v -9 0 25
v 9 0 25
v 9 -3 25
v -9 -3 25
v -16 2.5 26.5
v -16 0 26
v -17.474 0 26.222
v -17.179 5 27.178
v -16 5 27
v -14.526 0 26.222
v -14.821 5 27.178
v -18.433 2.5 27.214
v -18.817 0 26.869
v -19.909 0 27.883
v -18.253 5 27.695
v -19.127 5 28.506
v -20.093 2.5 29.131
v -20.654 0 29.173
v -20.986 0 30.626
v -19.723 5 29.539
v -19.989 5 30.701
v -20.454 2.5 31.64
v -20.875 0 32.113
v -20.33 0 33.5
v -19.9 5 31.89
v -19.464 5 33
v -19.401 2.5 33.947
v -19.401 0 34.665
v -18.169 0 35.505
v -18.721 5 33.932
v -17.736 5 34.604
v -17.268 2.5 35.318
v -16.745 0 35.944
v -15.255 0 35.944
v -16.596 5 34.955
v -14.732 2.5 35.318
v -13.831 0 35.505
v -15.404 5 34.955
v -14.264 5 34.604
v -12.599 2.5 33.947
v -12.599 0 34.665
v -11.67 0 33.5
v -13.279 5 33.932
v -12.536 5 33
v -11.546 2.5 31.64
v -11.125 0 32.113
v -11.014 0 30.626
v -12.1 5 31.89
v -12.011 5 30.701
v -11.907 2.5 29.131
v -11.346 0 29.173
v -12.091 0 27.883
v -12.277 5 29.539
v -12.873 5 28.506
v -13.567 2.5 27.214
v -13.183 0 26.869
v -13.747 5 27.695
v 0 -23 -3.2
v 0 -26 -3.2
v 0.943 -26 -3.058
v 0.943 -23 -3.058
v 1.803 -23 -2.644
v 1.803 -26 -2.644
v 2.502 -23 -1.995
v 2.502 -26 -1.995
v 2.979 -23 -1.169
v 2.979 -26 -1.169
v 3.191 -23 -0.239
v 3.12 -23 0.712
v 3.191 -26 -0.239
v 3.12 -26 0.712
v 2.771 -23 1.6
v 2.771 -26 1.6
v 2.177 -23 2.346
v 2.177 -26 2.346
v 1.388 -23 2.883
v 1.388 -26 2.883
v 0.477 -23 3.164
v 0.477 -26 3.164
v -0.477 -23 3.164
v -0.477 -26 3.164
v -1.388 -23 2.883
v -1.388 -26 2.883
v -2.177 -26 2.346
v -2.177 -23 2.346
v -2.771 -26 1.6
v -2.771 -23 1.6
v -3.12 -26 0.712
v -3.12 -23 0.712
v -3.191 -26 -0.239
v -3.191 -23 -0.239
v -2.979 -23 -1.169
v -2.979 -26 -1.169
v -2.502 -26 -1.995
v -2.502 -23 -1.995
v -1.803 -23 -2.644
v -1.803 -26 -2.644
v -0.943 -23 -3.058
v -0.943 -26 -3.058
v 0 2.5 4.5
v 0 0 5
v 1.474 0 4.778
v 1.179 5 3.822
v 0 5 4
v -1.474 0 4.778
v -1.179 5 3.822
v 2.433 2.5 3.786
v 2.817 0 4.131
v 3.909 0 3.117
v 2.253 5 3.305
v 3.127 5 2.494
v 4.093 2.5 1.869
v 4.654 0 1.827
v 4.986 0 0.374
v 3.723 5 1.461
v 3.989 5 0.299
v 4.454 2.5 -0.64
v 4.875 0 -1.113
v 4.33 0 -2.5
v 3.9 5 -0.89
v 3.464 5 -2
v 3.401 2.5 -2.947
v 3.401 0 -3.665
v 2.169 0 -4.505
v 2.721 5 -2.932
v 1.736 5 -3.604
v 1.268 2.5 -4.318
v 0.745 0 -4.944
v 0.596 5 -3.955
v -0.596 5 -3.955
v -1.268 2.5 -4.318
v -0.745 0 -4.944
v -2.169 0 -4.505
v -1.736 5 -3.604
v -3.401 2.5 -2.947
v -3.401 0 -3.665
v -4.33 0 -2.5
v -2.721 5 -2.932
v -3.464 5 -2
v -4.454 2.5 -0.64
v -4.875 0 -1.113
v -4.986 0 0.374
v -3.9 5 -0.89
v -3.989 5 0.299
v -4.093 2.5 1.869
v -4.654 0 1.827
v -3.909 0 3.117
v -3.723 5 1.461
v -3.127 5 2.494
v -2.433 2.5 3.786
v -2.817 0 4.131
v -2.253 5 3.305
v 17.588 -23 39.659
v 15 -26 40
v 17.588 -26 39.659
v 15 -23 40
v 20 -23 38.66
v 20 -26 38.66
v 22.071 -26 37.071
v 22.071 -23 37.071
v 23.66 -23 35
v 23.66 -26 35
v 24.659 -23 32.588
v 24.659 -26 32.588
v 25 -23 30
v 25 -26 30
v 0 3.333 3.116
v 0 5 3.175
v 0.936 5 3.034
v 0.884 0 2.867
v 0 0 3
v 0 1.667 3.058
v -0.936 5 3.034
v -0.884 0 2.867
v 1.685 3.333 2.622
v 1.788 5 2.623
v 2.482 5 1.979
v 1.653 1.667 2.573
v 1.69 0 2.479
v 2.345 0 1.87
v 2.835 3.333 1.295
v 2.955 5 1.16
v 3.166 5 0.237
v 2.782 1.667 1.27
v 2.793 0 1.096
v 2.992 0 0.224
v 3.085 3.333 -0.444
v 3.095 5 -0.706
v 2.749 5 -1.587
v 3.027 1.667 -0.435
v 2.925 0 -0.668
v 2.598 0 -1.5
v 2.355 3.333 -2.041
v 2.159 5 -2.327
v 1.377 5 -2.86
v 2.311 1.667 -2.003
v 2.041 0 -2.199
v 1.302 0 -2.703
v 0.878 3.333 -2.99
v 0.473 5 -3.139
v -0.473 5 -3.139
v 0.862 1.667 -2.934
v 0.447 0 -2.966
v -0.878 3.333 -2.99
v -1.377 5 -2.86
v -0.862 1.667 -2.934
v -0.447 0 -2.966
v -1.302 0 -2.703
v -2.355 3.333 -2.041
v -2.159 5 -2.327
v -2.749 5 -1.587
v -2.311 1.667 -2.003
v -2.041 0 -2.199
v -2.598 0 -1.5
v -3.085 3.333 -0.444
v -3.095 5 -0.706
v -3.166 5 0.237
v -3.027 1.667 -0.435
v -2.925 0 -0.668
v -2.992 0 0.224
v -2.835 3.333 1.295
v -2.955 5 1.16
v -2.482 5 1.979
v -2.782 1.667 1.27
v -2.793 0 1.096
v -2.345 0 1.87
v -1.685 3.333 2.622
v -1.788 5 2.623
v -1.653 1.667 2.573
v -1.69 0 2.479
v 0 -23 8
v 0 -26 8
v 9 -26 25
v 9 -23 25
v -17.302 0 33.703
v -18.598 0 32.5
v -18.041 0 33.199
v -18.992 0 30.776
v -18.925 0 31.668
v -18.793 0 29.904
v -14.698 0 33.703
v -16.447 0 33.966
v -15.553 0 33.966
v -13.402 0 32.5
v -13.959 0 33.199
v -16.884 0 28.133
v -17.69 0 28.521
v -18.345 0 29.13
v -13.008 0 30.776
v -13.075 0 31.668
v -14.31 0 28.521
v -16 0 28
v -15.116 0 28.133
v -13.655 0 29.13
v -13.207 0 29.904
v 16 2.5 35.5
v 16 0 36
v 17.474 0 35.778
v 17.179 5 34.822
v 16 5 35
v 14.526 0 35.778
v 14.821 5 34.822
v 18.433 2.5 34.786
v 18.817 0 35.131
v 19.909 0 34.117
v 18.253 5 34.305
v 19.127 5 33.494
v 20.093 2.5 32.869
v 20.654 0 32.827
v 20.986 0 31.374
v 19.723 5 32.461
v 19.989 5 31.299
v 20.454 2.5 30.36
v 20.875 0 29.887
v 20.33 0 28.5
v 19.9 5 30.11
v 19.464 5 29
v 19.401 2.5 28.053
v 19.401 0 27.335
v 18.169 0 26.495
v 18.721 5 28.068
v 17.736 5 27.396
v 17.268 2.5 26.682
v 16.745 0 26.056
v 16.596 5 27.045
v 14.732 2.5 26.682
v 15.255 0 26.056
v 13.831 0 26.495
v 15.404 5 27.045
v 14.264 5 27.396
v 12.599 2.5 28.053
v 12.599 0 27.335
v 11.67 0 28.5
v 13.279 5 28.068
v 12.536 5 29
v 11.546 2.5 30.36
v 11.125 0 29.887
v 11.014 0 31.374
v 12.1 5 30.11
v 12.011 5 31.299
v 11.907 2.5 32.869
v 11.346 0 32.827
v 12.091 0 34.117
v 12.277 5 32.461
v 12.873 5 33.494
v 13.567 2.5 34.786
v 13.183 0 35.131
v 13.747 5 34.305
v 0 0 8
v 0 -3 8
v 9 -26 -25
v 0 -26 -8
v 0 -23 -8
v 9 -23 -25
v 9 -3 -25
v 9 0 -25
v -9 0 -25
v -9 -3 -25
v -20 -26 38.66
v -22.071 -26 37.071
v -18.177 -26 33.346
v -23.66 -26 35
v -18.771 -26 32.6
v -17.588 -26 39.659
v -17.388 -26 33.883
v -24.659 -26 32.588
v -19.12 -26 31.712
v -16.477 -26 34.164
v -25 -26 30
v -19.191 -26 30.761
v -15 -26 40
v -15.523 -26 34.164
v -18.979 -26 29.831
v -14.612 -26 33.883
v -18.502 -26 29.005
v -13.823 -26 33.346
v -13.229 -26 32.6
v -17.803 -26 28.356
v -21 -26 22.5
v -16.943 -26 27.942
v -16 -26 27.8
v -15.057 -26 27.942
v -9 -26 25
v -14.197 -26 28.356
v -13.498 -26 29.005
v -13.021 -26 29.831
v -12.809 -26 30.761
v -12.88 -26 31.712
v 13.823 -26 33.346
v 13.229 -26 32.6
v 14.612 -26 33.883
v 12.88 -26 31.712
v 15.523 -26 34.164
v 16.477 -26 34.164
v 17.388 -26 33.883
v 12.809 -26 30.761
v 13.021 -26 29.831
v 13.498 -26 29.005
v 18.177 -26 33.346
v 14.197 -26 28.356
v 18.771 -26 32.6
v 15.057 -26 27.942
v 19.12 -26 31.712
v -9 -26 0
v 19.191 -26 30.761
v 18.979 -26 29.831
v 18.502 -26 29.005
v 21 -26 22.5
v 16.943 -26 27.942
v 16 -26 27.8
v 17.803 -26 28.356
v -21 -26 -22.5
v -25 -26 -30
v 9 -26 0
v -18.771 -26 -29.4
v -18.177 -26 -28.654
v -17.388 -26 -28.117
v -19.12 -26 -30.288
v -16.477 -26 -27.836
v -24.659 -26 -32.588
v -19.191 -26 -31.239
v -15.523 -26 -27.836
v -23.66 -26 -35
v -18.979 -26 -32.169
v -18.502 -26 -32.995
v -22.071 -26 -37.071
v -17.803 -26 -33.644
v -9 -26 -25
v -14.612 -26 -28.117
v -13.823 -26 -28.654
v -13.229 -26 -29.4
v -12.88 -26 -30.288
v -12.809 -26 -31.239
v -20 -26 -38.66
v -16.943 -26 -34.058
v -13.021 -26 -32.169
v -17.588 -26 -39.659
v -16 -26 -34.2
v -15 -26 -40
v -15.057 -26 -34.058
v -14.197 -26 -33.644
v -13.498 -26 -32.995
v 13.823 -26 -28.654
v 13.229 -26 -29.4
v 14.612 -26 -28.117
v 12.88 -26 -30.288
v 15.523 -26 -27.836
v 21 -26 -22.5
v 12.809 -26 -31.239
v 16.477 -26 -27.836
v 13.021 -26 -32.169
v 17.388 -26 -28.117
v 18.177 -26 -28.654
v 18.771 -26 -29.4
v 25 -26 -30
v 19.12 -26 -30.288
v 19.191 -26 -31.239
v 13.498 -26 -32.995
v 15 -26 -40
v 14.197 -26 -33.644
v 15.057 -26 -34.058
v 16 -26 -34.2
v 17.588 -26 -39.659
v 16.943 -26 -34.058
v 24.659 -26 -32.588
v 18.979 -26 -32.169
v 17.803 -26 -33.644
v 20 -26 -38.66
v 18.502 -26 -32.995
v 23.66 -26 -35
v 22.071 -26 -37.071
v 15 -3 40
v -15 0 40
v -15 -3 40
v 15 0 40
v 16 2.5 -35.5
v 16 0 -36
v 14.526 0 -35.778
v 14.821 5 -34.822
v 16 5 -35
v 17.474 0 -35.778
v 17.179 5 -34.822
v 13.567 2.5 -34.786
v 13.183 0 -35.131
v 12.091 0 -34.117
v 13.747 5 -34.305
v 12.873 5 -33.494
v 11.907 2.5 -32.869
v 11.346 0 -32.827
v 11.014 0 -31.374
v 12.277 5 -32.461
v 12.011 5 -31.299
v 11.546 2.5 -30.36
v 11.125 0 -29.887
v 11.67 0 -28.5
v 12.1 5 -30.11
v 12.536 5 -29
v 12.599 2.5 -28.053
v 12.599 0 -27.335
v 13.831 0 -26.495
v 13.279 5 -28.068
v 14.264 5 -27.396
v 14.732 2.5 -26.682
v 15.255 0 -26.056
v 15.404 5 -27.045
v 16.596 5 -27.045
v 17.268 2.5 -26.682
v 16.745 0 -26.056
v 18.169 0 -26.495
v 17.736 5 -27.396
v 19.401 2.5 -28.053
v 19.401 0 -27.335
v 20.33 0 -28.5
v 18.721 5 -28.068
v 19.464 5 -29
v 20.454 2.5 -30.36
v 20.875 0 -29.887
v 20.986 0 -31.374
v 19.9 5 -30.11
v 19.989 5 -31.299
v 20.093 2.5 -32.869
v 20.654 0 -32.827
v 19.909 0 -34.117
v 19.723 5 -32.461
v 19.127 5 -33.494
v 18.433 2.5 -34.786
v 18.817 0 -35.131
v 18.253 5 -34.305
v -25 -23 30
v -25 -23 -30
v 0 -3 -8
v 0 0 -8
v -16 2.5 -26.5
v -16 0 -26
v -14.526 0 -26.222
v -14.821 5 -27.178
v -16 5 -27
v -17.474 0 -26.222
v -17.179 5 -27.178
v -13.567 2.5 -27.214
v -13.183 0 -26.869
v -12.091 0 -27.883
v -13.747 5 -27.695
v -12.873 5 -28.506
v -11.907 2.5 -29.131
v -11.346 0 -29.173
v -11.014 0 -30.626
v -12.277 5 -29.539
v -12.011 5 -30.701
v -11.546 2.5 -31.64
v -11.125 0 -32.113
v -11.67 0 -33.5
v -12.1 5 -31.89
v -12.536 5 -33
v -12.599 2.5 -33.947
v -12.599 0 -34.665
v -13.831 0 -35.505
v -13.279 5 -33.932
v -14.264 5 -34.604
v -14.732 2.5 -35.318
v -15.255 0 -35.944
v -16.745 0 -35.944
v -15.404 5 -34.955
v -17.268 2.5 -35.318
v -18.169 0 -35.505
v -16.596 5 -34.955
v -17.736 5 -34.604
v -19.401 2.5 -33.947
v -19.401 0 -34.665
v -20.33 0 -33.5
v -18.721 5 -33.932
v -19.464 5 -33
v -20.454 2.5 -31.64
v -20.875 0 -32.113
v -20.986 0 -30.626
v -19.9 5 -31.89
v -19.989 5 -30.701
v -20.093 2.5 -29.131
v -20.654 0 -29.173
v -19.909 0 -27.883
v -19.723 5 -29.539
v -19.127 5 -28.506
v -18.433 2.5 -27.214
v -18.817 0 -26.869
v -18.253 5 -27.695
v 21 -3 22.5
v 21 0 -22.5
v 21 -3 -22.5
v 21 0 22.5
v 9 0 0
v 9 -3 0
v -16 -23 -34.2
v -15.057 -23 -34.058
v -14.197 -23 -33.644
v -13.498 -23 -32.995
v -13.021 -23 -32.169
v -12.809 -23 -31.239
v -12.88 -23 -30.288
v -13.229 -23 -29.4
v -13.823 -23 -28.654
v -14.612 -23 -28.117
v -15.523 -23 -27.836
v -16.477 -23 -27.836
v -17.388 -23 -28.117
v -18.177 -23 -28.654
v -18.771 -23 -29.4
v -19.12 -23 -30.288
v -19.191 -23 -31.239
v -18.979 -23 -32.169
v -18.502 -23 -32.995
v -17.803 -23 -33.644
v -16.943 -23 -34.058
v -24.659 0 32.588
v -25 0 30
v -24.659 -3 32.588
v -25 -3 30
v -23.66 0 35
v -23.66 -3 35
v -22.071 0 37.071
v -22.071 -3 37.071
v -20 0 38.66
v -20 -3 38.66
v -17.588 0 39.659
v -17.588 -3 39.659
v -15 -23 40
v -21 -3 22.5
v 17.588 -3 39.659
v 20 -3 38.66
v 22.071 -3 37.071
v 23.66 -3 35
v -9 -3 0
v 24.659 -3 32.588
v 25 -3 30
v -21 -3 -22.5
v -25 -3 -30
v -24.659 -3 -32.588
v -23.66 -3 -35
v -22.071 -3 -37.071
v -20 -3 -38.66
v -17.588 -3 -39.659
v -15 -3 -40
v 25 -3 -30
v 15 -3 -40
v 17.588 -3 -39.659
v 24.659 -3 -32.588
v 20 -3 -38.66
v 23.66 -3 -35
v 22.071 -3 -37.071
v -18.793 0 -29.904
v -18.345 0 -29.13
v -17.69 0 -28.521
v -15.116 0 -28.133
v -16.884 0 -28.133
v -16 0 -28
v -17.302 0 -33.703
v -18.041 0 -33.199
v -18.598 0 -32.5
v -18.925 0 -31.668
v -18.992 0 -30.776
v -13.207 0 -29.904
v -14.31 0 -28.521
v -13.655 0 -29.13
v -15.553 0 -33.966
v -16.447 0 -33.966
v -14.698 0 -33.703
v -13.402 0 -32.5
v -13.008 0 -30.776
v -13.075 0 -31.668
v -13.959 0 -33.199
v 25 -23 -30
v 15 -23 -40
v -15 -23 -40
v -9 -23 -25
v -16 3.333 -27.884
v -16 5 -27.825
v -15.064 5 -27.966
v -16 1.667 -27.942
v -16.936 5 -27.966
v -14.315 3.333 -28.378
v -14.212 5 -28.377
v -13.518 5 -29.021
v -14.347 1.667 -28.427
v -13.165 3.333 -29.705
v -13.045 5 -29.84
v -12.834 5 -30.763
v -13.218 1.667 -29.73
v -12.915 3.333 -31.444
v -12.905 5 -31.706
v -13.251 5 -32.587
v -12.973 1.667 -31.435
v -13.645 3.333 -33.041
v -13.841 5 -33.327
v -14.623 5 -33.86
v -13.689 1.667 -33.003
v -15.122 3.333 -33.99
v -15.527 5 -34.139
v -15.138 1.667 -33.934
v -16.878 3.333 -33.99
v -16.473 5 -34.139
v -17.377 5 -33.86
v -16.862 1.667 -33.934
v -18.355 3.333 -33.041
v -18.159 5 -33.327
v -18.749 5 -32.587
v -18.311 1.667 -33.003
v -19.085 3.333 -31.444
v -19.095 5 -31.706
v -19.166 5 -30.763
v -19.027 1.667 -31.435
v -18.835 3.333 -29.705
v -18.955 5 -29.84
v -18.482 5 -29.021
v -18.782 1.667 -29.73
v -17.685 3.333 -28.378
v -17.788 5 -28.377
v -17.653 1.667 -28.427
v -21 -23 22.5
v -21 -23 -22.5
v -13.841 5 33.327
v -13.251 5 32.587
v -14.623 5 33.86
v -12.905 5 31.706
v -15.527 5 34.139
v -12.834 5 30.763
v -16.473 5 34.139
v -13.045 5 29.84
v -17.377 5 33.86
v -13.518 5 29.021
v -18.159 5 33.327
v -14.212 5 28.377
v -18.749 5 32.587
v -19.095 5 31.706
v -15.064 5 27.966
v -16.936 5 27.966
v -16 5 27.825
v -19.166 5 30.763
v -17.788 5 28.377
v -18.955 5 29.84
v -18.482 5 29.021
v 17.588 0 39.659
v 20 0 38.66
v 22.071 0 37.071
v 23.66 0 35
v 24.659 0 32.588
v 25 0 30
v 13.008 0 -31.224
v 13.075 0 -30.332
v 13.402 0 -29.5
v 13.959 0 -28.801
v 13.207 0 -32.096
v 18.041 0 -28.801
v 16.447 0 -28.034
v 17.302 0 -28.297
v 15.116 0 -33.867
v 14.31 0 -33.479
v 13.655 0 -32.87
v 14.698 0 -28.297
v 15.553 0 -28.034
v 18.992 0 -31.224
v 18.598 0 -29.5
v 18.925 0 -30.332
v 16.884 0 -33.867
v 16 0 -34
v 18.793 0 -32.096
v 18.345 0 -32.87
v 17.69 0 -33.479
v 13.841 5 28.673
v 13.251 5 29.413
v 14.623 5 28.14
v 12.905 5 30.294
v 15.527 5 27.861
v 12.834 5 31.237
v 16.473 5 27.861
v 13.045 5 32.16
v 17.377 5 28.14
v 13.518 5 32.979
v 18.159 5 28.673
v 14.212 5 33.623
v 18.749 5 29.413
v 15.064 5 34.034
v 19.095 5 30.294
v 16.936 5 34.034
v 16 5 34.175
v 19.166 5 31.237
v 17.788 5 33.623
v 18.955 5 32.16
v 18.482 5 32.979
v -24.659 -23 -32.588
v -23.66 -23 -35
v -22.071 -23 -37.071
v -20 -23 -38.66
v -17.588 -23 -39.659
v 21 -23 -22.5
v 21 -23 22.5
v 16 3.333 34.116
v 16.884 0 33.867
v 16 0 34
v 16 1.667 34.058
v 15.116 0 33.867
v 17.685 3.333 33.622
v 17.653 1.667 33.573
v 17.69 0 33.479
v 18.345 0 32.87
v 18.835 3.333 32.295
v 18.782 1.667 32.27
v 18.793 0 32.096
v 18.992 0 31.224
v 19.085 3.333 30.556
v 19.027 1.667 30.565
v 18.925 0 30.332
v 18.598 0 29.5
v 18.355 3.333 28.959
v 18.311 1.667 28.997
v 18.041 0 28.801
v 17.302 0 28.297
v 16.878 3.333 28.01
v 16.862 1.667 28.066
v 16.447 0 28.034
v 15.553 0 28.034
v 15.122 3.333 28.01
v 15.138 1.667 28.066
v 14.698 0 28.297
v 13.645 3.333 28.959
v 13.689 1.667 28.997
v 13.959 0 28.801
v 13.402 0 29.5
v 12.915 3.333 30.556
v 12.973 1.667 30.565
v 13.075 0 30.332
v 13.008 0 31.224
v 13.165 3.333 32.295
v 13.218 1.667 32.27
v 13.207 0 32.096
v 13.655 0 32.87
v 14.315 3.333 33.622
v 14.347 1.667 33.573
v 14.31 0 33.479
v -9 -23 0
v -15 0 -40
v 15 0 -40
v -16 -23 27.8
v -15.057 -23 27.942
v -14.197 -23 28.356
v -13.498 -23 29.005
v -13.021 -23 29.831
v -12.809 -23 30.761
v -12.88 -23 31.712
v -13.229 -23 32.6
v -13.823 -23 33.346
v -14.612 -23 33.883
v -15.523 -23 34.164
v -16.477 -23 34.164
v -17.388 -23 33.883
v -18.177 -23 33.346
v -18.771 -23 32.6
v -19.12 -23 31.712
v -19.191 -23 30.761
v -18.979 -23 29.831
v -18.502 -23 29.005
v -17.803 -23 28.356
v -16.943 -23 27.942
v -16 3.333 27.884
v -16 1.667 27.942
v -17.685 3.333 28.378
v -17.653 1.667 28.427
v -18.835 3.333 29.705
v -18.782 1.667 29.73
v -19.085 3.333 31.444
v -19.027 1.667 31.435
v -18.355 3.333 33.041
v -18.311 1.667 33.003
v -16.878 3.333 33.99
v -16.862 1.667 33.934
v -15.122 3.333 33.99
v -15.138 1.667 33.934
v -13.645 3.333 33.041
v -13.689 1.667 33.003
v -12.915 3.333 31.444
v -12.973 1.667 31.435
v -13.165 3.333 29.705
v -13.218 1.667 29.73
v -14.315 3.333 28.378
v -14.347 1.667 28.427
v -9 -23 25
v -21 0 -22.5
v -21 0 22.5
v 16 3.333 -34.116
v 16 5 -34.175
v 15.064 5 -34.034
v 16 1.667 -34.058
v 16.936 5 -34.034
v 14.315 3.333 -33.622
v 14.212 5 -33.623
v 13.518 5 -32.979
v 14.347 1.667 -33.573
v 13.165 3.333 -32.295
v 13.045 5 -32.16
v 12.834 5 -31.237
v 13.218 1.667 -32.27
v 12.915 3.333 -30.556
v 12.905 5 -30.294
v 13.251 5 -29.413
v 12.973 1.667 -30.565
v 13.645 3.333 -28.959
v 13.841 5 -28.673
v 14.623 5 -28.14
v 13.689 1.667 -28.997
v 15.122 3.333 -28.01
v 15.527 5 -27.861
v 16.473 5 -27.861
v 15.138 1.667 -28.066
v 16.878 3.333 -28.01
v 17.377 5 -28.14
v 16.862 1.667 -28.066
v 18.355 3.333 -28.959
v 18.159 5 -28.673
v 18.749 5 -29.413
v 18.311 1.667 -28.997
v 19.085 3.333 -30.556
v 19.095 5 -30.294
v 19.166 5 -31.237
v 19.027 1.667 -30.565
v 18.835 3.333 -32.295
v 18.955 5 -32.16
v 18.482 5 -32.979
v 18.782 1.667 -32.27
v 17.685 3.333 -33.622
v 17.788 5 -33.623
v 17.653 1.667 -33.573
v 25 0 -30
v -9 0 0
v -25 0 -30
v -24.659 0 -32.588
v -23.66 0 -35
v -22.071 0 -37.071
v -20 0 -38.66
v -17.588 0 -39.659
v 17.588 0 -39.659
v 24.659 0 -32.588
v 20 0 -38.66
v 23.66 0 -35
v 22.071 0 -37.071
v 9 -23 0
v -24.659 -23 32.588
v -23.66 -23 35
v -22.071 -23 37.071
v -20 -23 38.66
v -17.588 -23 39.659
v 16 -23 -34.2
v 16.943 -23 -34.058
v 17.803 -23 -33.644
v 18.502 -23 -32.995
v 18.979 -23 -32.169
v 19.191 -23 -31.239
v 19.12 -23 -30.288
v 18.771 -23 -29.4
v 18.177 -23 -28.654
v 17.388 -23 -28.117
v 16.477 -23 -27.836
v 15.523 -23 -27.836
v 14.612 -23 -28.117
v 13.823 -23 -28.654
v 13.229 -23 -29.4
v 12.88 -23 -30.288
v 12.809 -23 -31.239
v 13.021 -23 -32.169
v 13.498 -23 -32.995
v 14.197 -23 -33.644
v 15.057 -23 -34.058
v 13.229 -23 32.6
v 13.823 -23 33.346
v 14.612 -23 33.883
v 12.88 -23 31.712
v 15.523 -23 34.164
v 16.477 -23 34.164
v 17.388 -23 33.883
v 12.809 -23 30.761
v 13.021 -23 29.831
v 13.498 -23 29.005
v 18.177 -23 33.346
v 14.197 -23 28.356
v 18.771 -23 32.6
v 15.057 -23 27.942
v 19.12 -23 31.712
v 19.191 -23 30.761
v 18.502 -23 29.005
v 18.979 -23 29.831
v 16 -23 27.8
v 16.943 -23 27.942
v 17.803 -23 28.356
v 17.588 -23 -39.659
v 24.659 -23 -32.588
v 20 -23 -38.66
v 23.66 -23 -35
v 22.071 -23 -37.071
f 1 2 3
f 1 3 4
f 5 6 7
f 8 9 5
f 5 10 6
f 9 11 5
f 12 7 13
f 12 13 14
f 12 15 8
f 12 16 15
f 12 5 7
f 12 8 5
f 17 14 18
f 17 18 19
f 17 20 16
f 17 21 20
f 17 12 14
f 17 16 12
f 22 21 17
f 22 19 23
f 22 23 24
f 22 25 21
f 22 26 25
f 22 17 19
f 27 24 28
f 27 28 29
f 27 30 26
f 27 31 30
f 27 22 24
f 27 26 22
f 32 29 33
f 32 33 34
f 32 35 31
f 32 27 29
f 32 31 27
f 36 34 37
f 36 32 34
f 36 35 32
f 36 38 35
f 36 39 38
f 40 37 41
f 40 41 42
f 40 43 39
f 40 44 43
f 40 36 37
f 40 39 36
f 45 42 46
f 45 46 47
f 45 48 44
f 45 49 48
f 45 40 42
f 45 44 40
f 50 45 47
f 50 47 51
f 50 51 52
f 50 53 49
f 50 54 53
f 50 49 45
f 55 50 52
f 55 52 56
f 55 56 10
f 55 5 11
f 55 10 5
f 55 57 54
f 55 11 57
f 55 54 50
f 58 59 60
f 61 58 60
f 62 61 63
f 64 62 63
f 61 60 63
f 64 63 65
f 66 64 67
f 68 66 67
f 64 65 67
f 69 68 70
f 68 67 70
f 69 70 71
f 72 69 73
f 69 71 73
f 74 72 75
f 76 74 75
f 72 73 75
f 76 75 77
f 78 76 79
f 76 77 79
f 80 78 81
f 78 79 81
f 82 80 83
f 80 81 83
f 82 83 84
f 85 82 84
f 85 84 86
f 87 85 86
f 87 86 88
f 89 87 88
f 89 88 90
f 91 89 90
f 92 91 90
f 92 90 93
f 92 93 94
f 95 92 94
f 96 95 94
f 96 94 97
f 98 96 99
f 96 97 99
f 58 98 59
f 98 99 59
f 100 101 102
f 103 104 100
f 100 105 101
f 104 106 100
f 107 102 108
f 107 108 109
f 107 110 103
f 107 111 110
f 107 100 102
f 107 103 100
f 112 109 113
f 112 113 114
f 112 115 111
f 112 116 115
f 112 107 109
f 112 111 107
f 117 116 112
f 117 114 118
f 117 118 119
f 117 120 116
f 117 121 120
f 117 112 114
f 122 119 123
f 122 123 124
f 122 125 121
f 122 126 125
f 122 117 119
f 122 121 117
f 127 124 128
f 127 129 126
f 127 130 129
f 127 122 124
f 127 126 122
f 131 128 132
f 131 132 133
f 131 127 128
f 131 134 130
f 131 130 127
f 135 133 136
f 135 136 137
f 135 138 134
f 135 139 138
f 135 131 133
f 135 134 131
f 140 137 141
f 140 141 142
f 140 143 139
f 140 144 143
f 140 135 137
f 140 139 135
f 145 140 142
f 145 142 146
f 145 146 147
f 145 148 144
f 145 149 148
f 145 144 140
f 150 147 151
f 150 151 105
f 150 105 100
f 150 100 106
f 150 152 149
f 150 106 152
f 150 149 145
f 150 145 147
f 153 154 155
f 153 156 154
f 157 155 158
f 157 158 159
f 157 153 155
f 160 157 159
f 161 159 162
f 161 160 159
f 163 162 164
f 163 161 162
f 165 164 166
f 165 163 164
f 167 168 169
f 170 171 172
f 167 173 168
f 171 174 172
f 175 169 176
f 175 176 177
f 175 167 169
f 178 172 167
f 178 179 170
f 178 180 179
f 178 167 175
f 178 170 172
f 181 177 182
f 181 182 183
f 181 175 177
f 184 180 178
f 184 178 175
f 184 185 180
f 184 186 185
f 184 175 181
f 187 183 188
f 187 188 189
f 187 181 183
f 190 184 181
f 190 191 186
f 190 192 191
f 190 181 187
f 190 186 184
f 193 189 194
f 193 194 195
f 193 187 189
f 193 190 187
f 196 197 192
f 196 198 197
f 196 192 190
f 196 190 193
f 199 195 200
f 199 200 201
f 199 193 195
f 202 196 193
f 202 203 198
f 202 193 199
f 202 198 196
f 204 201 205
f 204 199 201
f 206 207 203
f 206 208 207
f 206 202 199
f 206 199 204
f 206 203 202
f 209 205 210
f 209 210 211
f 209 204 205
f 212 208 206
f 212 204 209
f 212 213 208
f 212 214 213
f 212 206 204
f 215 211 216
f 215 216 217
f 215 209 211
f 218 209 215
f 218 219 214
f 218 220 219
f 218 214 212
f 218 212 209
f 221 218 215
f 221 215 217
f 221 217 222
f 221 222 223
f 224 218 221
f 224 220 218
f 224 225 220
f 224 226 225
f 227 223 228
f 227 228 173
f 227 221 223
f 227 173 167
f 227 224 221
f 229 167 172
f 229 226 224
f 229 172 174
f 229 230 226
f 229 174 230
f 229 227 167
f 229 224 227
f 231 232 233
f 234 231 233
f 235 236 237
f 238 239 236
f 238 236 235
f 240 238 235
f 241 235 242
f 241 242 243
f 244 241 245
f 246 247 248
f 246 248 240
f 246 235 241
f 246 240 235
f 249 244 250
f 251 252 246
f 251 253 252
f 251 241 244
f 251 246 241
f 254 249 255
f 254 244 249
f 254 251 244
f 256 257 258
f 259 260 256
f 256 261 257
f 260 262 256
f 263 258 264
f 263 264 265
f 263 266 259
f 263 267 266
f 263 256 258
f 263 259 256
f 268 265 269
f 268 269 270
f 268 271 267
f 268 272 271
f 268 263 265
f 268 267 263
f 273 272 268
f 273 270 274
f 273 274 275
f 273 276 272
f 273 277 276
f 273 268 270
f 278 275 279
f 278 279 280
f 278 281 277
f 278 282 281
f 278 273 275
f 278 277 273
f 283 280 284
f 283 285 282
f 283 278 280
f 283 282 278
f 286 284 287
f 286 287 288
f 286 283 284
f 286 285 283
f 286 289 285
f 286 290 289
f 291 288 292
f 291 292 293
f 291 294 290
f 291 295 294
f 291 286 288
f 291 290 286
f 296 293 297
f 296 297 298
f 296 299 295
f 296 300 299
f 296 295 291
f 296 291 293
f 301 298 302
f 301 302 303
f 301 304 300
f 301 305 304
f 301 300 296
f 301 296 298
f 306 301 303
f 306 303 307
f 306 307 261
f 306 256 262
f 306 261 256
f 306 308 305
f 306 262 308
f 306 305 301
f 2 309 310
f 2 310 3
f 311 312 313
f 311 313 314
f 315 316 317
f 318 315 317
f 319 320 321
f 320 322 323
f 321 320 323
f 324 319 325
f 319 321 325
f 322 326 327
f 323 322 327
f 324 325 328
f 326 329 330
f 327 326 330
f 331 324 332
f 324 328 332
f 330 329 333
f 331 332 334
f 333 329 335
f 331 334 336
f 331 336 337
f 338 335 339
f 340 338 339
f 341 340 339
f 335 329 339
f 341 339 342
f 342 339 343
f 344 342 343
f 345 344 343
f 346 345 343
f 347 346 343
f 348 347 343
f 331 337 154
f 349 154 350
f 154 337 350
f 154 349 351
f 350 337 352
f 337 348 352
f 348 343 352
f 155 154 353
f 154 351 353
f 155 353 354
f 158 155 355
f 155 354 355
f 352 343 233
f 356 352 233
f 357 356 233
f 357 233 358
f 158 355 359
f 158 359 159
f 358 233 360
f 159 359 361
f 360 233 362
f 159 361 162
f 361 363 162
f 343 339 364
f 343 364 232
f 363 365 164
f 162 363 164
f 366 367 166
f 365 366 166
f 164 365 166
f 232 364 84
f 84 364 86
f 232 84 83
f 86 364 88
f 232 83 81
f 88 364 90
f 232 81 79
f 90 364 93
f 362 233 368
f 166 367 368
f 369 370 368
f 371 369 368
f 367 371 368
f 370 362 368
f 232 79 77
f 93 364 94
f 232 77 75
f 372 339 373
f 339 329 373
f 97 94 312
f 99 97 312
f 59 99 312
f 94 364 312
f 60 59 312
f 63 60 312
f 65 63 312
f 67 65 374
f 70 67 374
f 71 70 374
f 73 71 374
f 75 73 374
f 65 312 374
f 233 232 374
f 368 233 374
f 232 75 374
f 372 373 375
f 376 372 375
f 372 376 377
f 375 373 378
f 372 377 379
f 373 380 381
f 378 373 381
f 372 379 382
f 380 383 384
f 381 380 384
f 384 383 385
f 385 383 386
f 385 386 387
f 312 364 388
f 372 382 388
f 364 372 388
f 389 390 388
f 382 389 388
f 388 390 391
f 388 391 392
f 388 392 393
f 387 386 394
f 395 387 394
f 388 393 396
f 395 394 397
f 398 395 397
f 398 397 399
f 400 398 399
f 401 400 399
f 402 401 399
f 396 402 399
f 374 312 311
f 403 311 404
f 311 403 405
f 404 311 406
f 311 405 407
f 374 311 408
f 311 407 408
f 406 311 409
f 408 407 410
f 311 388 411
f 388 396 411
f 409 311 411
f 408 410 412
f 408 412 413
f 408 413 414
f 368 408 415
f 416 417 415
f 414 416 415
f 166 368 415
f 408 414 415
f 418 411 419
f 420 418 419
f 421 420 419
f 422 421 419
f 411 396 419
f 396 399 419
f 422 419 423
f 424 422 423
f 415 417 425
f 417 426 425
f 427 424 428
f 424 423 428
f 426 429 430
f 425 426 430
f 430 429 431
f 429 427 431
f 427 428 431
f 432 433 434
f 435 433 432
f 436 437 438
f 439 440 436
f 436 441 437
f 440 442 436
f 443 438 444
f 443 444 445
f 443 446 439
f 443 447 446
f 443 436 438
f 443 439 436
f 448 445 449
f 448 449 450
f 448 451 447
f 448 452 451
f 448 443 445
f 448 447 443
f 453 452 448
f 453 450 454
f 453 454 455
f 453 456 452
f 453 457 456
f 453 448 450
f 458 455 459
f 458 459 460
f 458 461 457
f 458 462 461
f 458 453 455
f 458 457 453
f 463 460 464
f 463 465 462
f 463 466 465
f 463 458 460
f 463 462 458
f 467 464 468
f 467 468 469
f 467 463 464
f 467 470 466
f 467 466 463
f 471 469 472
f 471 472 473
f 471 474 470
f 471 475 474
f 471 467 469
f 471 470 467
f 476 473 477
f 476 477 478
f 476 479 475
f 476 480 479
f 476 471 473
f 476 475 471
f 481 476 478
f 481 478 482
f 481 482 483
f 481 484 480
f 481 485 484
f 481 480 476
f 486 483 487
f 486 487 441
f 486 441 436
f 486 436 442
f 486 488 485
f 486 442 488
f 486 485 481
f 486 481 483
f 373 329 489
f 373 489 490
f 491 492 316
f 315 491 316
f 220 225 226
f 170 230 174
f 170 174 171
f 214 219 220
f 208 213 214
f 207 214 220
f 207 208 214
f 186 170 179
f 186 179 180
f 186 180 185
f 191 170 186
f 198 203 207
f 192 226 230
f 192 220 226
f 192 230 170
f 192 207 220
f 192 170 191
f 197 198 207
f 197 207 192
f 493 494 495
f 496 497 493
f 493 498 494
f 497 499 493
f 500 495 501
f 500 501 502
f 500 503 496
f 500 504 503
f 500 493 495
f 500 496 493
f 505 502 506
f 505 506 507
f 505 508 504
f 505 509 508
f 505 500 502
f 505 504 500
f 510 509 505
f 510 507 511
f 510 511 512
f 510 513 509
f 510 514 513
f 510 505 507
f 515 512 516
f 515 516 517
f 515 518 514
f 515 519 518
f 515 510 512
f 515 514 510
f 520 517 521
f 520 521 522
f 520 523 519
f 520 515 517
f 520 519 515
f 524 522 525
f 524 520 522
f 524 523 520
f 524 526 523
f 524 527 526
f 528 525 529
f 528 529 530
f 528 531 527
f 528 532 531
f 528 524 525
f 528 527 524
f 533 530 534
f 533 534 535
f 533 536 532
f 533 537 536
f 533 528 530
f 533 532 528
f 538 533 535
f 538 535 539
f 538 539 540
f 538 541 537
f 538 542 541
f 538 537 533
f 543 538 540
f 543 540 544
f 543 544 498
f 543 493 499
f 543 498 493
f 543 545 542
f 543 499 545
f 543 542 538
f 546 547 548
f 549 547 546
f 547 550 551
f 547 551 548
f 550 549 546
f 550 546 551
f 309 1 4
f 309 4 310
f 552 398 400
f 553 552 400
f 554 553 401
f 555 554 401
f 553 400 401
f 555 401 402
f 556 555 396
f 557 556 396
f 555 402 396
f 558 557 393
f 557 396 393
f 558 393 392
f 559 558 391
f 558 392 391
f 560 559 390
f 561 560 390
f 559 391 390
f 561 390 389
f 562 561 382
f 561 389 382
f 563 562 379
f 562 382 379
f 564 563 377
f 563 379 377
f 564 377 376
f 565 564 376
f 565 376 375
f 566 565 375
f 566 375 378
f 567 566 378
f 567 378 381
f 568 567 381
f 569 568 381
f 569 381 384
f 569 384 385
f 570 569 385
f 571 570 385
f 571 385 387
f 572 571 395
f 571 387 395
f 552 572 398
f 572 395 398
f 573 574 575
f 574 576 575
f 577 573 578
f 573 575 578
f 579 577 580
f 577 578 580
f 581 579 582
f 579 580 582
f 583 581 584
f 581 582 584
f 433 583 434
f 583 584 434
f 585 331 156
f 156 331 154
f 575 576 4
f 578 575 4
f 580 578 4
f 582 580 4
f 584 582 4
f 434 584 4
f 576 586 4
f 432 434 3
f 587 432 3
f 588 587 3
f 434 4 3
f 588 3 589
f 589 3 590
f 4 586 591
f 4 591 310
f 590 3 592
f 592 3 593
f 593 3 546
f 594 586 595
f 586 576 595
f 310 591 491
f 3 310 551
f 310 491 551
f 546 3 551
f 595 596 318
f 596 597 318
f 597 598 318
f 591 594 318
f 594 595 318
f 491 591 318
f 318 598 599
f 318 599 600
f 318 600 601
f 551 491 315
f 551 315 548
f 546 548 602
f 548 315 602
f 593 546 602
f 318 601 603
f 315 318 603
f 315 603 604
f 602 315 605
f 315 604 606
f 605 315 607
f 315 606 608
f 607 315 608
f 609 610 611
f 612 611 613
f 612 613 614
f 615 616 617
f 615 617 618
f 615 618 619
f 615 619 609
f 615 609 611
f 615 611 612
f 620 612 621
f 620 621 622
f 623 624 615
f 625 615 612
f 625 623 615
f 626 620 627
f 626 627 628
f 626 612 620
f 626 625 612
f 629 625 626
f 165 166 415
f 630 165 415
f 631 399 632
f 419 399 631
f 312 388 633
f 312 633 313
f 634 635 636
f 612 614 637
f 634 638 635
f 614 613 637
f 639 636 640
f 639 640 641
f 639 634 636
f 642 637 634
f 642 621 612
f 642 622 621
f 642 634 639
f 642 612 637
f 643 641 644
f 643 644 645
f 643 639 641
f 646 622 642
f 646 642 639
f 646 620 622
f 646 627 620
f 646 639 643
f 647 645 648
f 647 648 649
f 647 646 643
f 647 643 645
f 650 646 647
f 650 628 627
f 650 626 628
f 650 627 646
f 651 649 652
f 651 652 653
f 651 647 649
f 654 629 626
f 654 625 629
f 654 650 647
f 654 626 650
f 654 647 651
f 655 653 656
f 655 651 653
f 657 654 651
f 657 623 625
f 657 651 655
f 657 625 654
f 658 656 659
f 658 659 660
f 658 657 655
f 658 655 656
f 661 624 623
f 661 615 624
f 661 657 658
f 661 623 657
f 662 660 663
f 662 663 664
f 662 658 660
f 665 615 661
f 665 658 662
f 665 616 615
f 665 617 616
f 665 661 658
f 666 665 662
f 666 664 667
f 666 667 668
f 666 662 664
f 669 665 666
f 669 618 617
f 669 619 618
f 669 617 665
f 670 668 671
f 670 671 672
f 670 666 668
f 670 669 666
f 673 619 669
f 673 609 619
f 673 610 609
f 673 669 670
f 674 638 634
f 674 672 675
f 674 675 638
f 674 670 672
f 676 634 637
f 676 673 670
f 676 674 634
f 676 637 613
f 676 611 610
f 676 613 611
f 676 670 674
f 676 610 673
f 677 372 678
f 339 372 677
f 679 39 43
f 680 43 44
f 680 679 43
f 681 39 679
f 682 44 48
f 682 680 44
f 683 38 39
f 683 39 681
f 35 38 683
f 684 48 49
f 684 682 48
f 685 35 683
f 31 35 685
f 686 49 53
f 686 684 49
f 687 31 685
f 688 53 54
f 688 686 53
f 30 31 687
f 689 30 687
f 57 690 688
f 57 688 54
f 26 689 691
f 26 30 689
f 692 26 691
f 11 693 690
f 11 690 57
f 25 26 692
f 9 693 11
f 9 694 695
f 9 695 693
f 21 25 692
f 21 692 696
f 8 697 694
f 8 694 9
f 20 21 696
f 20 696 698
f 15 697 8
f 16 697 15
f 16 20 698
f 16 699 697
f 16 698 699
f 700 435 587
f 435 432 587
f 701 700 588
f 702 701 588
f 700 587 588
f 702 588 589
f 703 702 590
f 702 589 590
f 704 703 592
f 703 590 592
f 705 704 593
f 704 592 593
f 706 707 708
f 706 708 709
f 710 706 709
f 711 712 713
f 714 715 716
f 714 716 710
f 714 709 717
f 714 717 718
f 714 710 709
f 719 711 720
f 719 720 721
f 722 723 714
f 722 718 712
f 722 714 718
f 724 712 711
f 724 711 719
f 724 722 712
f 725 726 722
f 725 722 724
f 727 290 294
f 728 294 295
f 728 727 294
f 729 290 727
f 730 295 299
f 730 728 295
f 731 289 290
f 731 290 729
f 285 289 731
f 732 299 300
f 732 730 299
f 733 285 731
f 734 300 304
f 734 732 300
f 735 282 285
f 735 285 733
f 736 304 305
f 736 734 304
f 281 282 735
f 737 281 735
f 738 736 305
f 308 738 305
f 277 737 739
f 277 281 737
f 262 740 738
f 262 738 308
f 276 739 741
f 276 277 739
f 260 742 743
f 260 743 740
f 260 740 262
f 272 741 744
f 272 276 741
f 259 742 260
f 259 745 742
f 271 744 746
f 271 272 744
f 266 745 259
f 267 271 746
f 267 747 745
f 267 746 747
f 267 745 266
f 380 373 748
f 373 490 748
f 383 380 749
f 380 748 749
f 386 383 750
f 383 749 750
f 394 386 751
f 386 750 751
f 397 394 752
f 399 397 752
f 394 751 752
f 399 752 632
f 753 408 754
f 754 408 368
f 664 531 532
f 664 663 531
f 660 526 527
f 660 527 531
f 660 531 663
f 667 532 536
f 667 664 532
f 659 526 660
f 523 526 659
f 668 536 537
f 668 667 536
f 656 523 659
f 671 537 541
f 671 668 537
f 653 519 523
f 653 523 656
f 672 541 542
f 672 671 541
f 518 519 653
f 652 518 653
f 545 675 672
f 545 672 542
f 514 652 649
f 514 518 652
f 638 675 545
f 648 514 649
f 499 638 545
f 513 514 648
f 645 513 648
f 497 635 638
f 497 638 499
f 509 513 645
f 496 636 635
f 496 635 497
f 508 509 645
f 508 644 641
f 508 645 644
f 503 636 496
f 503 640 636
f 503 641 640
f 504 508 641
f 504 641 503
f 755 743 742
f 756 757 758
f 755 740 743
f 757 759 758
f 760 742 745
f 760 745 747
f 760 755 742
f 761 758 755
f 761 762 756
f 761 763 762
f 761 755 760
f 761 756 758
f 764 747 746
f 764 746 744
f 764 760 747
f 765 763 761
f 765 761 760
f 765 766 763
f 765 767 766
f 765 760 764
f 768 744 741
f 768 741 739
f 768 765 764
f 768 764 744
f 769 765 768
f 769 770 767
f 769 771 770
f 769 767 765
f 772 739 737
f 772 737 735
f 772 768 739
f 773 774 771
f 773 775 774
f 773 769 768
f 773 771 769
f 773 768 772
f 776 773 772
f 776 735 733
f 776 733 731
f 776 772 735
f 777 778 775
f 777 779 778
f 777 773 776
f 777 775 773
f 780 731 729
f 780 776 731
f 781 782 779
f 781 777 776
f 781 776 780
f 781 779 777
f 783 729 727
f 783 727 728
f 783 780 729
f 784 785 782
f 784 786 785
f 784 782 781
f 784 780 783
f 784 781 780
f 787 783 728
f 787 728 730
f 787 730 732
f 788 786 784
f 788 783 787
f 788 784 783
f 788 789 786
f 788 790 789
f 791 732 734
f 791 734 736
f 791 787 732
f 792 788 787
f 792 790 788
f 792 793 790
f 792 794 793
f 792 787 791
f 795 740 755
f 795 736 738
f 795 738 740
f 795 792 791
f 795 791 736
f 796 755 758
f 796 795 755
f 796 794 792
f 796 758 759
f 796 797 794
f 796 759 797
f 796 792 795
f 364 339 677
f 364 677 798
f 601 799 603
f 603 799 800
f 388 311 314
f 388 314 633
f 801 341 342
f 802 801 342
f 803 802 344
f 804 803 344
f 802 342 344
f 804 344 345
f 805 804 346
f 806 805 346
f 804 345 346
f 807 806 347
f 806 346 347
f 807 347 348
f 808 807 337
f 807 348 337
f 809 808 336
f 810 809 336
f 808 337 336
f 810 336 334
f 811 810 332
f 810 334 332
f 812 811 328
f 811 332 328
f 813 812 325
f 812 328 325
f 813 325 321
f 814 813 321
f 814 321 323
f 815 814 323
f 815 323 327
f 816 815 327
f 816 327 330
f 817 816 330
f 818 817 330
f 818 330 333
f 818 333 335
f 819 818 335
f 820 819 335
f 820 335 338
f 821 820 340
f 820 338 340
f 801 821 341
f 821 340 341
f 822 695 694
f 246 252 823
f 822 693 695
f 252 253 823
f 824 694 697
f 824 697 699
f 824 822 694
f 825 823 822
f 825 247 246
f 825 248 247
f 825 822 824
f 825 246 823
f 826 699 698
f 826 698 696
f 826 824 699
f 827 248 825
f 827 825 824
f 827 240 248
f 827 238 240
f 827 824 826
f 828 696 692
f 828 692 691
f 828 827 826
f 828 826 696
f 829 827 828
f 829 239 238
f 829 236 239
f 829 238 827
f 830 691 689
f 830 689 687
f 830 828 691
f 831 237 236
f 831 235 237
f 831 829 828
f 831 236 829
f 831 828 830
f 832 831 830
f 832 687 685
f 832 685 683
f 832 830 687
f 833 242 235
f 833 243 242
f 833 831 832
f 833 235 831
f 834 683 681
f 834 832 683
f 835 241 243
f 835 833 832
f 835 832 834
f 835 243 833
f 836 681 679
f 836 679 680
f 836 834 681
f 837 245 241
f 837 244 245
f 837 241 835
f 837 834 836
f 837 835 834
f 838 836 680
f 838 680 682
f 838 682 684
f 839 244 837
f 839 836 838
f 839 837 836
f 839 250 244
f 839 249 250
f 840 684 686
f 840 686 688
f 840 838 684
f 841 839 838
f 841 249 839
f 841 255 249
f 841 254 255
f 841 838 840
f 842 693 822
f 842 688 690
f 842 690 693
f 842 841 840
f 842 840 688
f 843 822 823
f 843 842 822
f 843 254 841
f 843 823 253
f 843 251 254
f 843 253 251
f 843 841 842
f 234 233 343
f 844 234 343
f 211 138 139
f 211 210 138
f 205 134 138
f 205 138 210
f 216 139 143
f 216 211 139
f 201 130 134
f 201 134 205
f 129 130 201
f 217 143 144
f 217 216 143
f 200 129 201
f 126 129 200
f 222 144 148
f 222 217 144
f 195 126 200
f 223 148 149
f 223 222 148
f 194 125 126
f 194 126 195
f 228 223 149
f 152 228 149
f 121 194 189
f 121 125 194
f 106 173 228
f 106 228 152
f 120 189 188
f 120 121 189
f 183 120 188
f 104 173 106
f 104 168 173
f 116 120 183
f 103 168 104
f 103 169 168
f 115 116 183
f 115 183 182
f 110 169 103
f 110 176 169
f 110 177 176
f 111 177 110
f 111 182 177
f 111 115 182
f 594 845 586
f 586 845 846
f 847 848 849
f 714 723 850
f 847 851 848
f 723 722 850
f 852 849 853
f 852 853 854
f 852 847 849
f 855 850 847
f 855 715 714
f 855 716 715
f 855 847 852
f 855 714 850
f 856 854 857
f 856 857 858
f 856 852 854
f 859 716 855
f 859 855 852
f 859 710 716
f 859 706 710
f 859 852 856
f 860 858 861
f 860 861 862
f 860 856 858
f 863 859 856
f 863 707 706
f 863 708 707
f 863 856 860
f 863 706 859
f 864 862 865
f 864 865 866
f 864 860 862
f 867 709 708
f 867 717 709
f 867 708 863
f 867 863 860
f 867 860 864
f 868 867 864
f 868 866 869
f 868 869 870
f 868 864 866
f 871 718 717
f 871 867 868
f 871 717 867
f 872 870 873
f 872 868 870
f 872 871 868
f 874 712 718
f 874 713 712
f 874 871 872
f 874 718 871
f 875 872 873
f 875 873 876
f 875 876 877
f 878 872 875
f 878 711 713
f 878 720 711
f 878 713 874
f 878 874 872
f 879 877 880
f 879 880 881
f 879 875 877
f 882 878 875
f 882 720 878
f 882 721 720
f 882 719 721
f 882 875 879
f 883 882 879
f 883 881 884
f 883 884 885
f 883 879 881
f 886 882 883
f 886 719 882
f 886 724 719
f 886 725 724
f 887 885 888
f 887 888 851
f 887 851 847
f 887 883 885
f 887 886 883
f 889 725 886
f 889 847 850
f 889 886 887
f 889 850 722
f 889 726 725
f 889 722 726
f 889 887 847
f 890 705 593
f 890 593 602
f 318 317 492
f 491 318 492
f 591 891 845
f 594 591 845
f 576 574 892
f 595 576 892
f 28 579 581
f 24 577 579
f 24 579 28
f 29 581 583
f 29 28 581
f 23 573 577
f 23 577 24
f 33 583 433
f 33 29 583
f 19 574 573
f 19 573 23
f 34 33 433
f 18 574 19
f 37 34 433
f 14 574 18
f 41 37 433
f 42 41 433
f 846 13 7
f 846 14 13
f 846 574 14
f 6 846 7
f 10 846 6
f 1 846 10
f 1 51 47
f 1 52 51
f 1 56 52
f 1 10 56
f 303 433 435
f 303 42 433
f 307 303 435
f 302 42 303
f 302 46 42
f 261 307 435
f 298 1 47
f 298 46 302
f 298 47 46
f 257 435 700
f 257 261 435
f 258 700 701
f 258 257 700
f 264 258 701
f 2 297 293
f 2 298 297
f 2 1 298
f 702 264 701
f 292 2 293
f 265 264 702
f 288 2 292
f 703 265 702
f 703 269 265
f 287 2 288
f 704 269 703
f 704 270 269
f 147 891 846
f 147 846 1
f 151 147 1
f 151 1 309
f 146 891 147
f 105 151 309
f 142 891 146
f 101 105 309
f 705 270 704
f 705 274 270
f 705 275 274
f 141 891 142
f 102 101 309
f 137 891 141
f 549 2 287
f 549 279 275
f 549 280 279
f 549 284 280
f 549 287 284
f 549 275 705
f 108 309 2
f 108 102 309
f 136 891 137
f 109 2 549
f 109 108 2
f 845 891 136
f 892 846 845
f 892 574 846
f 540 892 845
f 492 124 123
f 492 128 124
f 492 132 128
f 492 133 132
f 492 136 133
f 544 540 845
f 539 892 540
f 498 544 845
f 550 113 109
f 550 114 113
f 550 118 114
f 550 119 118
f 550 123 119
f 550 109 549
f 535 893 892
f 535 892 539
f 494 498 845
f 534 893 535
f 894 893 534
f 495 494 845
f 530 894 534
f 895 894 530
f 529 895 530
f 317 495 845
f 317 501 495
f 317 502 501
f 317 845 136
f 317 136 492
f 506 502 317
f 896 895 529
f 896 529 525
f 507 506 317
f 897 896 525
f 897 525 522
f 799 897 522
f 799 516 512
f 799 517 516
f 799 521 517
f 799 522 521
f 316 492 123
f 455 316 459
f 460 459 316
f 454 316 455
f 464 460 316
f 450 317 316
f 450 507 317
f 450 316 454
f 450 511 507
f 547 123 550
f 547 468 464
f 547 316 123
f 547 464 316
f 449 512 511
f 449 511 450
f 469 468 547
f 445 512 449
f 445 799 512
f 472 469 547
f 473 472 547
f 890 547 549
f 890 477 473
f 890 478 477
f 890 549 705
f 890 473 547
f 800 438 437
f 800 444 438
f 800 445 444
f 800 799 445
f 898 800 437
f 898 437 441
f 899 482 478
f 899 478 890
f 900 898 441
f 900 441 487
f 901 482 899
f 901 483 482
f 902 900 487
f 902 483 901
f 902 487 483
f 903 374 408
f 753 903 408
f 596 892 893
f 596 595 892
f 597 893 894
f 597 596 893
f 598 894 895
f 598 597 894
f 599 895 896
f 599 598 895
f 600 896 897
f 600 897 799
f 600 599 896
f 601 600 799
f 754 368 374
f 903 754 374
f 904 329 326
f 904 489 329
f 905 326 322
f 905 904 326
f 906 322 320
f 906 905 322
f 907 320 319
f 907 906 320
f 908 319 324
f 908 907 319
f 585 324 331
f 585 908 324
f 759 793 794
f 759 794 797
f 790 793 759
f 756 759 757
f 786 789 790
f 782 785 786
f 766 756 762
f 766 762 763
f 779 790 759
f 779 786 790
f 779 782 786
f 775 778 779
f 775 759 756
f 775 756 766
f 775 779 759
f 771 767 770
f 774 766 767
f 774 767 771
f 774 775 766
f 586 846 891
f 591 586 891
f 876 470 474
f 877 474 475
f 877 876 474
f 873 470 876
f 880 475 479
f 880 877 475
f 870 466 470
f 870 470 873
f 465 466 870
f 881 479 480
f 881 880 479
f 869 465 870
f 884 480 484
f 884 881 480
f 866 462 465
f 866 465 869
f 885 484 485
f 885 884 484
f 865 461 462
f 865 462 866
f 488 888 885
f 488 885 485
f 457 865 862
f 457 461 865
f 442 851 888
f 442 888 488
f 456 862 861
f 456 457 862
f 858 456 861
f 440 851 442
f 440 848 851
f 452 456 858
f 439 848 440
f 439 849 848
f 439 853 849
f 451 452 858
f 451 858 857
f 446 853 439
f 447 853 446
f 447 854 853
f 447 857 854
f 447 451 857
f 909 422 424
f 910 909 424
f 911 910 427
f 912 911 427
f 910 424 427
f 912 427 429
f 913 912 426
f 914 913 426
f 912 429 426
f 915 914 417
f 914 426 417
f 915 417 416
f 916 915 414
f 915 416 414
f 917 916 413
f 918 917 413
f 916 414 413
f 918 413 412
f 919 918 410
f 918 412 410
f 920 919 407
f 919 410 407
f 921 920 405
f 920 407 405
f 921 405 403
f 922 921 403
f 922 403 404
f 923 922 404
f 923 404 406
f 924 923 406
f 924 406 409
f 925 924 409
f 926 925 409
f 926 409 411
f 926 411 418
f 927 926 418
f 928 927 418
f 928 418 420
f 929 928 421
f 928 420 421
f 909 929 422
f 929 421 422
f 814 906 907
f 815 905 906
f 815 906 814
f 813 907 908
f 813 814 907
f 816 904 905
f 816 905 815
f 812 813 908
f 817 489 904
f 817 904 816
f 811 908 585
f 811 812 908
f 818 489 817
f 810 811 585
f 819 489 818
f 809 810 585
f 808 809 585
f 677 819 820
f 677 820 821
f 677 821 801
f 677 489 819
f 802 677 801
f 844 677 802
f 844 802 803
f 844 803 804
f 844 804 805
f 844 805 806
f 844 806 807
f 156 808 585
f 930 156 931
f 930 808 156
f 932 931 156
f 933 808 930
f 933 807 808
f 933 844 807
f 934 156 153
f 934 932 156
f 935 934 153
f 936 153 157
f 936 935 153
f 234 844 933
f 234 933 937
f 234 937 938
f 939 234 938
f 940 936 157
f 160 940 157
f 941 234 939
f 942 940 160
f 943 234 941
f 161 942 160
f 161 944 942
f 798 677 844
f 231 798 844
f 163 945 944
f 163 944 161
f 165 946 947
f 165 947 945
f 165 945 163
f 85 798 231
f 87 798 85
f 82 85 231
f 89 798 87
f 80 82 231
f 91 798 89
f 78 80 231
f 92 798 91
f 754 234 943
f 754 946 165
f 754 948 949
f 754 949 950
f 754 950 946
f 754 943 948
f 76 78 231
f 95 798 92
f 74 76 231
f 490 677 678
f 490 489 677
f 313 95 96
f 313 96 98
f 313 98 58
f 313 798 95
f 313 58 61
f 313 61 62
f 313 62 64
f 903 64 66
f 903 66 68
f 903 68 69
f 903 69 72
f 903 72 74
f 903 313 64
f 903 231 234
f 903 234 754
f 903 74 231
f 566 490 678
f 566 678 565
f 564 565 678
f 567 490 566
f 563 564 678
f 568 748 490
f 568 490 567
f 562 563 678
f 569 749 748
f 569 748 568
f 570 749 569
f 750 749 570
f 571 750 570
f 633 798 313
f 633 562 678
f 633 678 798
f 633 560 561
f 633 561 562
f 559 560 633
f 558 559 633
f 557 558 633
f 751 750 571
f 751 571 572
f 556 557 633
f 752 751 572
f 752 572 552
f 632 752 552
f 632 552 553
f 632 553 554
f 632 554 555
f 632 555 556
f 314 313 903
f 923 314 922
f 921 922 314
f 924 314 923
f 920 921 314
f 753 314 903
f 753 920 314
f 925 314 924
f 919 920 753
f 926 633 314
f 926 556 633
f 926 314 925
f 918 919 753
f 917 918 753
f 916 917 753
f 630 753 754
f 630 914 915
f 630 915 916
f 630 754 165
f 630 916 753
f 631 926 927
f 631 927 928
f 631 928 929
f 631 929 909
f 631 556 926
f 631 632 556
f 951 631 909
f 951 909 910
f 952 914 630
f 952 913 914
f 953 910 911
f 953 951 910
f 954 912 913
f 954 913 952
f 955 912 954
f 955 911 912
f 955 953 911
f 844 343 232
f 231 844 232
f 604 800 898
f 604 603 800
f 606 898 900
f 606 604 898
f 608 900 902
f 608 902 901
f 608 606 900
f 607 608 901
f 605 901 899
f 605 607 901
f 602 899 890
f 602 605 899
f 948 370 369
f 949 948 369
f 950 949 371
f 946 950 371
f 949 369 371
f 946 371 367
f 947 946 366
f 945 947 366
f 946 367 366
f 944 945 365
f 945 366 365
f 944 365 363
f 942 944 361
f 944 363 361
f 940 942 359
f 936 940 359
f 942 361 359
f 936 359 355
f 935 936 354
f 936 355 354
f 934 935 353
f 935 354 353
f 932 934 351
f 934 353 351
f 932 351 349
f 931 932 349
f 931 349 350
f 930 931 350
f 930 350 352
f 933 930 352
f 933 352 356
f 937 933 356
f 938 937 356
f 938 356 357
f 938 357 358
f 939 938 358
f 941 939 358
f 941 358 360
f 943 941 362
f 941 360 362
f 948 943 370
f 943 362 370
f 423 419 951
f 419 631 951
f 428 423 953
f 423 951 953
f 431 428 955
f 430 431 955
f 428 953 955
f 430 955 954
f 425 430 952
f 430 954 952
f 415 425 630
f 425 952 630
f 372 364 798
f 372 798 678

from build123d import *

# Parameters (mm, degrees)
SKETCH2_W           = 50
SKETCH2_H           = 80
BOSS_EXTRUDE1_DEPTH = 3
SKETCH3_R           = 5
SKETCH3_R_2         = 3
BOSS_EXTRUDE2_DEPTH = 5
CHAMFER1_SIZE       = 5
CHAMFER1_SIZE_2     = 1
CUT_EXTRUDE1_DEPTH  = 3
FILLET1_R           = 10
DRAFT3_ANGLE        = 2
SKETCH5_W           = 50
SKETCH5_H           = 80
CUT_EXTRUDE2_DEPTH  = 5
SKETCH6_R           = 3.2
CUT_EXTRUDE4_DEPTH  = 3


with BuildPart() as part:
    # Sketch2 → Boss-Extrude1 (new body)
    with BuildSketch(Plane(origin=(0, 0, 0), x_dir=(1, 0, 0), z_dir=(0, 1, 0))):
        Rectangle(SKETCH2_W, SKETCH2_H)
    extrude(amount=-BOSS_EXTRUDE1_DEPTH)

    # Sketch3 → Boss-Extrude2 (add)
    # profile 1 of 5: a face of its own
    with BuildSketch(Plane(origin=(0, 0, 0), x_dir=(1, 0, 0), z_dir=(0, 1, 0))):
        with Locations(Location((-16, 31, 0), (0, 0, 270))):
            Circle(SKETCH3_R)
        with Locations(Location((-16, 31, 0), (0, 0, 270))):
            Circle(SKETCH3_R_2, mode=Mode.SUBTRACT)
    # profile 2 of 5: a face of its own
    with BuildSketch(Plane(origin=(0, 0, 0), x_dir=(1, 0, 0), z_dir=(0, 1, 0))):
        with Locations(Location((16, 31, 0), (0, 0, 90))):
            Circle(SKETCH3_R)
        with Locations(Location((16, 31, 0), (0, 0, 90))):
            Circle(SKETCH3_R_2, mode=Mode.SUBTRACT)
    # profile 3 of 5: a face of its own
    with BuildSketch(Plane(origin=(0, 0, 0), x_dir=(1, 0, 0), z_dir=(0, 1, 0))):
        with Locations(Location((16, -31, 0), (0, 0, 270))):
            Circle(SKETCH3_R)
        with Locations(Location((16, -31, 0), (0, 0, 270))):
            Circle(SKETCH3_R_2, mode=Mode.SUBTRACT)
    # profile 4 of 5: a face of its own
    with BuildSketch(Plane(origin=(0, 0, 0), x_dir=(1, 0, 0), z_dir=(0, 1, 0))):
        with Locations(Location((-16, -31, 0), (0, 0, 90))):
            Circle(SKETCH3_R)
        with Locations(Location((-16, -31, 0), (0, 0, 90))):
            Circle(SKETCH3_R_2, mode=Mode.SUBTRACT)
    # profile 5 of 5: a face of its own
    with BuildSketch(Plane(origin=(0, 0, 0), x_dir=(1, 0, 0), z_dir=(0, 1, 0))):
        with Locations(Location((0, 0, 0), (0, 0, 270))):
            Circle(SKETCH3_R)
        with Locations(Location((0, 0, 0), (0, 0, 270))):
            Circle(SKETCH3_R_2, mode=Mode.SUBTRACT)
    extrude(amount=BOSS_EXTRUDE2_DEPTH)

    # Chamfer1
    # the kernel refuses this chamfer: 5, 1 mm, written as the material it takes off along each edge
    with BuildSketch(Plane(origin=(-16, 5, -31), x_dir=(0, 0, 1), z_dir=(-1, 0, 0))) as chamfer1_piece_1_section:
        Polygon((5, -CHAMFER1_SIZE), (5 - CHAMFER1_SIZE_2, 0), (5, 0), align=None)
    chamfer1_piece_1 = revolve(axis=Axis((-16, 5, -31), (0, 1, 0)), mode=Mode.PRIVATE)
    chamfer1_piece_1 = split(chamfer1_piece_1, bisect_by=Plane(origin=(-16, 0, -35.524949773), z_dir=(0, 1, 0)), keep=Keep.TOP, mode=Mode.PRIVATE)
    add(chamfer1_piece_1, mode=Mode.SUBTRACT)
    with BuildSketch(Plane(origin=(16, 5, -31), x_dir=(0, 0, -1), z_dir=(1, 0, 0))) as chamfer1_piece_2_section:
        Polygon((5, -CHAMFER1_SIZE), (5 - CHAMFER1_SIZE_2, 0), (5, 0), align=None)
    chamfer1_piece_2 = revolve(axis=Axis((16, 5, -31), (0, 1, 0)), mode=Mode.PRIVATE)
    chamfer1_piece_2 = split(chamfer1_piece_2, bisect_by=Plane(origin=(16, 0, -26.475050227), z_dir=(0, 1, 0)), keep=Keep.TOP, mode=Mode.PRIVATE)
    add(chamfer1_piece_2, mode=Mode.SUBTRACT)
    with BuildSketch(Plane(origin=(16, 5, 31), x_dir=(0, 0, 1), z_dir=(-1, 0, 0))) as chamfer1_piece_3_section:
        Polygon((5, -CHAMFER1_SIZE), (5 - CHAMFER1_SIZE_2, 0), (5, 0), align=None)
    chamfer1_piece_3 = revolve(axis=Axis((16, 5, 31), (0, 1, 0)), mode=Mode.PRIVATE)
    chamfer1_piece_3 = split(chamfer1_piece_3, bisect_by=Plane(origin=(16, 0, 26.475050227), z_dir=(0, 1, 0)), keep=Keep.TOP, mode=Mode.PRIVATE)
    add(chamfer1_piece_3, mode=Mode.SUBTRACT)
    with BuildSketch(Plane(origin=(-16, 5, 31), x_dir=(0, 0, -1), z_dir=(1, 0, 0))) as chamfer1_piece_4_section:
        Polygon((5, -CHAMFER1_SIZE), (5 - CHAMFER1_SIZE_2, 0), (5, 0), align=None)
    chamfer1_piece_4 = revolve(axis=Axis((-16, 5, 31), (0, 1, 0)), mode=Mode.PRIVATE)
    chamfer1_piece_4 = split(chamfer1_piece_4, bisect_by=Plane(origin=(-16, 0, 35.524949773), z_dir=(0, 1, 0)), keep=Keep.TOP, mode=Mode.PRIVATE)
    add(chamfer1_piece_4, mode=Mode.SUBTRACT)
    with BuildSketch(Plane(origin=(0, 5, 0), x_dir=(0, 0, 1), z_dir=(-1, 0, 0))) as chamfer1_piece_5_section:
        Polygon((5, -CHAMFER1_SIZE), (5 - CHAMFER1_SIZE_2, 0), (5, 0), align=None)
    chamfer1_piece_5 = revolve(axis=Axis((0, 5, 0), (0, 1, 0)), mode=Mode.PRIVATE)
    chamfer1_piece_5 = split(chamfer1_piece_5, bisect_by=Plane(origin=(0, 0, -4.524949773), z_dir=(0, 1, 0)), keep=Keep.TOP, mode=Mode.PRIVATE)
    add(chamfer1_piece_5, mode=Mode.SUBTRACT)

    # Sketch4 → Cut-Extrude1 (cut)
    with BuildSketch(Plane(origin=(0, 0, 0), x_dir=(1, 0, 0), z_dir=(0, 1, 0))):
        Polygon((-21, 22.5), (-21, -22.5), (-9, 0), align=None)
        Polygon((9, 0), (21, 22.5), (21, -22.5), align=None)
        Polygon((0, 8), (9, 25), (-9, 25), align=None)
        Polygon((0, -8), (9, -25), (-9, -25), align=None)
    extrude(amount=-CUT_EXTRUDE1_DEPTH, mode=Mode.SUBTRACT)

    # Fillet1
    fillet1_edges = [part.edges().sort_by_distance(p)[0] for p in [
        (-25, -1.5, -40),
        (25, -1.5, -40),
        (25, -1.5, 40),
        (-25, -1.5, 40),
    ]]
    fillet(fillet1_edges, radius=FILLET1_R)

    # Draft3
    draft3_faces = [part.faces().sort_by_distance(p)[0] for p in [
        (16, 2.5, -28),
        (-16, 2.5, -34),
        (-16, 2.5, 34),
        (0, 2.5, -3),
        (16, 2.5, 28),
    ]]
    draft(draft3_faces, Plane.ZX, DRAFT3_ANGLE)


with BuildPart() as body_2:
    # Mirror5: mirrored copy
    add(part.part.mirror(Plane(origin=(0, -13, 0), x_dir=(0, 0, 1), z_dir=(0, -1, 0))))

    # Sketch5 → Cut-Extrude2 (cut)
    with BuildSketch(Plane.XZ.offset(31)):
        Rectangle(SKETCH5_W, SKETCH5_H)
    extrude(amount=-CUT_EXTRUDE2_DEPTH, mode=Mode.SUBTRACT)

    # Sketch6 → Cut-Extrude4 (cut)
    with BuildSketch(Plane.XZ.offset(26)):
        with Locations(Location((-16, 31, 0), (0, 0, 270))):
            Circle(SKETCH6_R)
        with Locations(Location((0, 0, 0), (0, 0, 270))):
            Circle(SKETCH6_R)
        with Locations(Location((-16, -31, 0), (0, 0, 270))):
            Circle(SKETCH6_R)
        with Locations(Location((16, 31, 0), (0, 0, 270))):
            Circle(SKETCH6_R)
        with Locations(Location((16, -31, 0), (0, 0, 270))):
            Circle(SKETCH6_R)
    extrude(amount=-CUT_EXTRUDE4_DEPTH, mode=Mode.SUBTRACT)


solid = Compound([part.part, body_2.part])
